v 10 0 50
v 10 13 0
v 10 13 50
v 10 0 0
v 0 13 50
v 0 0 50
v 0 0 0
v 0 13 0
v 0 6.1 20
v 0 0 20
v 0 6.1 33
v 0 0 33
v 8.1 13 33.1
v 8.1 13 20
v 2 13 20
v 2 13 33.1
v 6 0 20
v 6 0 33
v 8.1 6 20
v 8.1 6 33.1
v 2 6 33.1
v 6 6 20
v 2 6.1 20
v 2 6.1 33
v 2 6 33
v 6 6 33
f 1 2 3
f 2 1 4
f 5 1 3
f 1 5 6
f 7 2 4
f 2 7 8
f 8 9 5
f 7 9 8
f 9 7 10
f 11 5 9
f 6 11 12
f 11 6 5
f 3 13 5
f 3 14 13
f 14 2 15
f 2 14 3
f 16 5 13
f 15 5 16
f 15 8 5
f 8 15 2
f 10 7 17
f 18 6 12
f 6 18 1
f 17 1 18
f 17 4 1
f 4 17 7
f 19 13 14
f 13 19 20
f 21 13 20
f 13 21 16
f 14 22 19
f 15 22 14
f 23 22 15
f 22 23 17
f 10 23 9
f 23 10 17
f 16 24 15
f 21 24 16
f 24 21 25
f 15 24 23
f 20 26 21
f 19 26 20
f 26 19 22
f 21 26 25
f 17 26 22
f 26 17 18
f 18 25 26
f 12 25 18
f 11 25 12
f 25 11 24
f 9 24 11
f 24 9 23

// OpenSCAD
verfuegendeTiefe = 23 - 10;
schalterSpiel = 2;
schalterLaenge = 13;
schalterBreite = 6;
schalterHoehe = 7;

difference() {
    cube([10, verfuegendeTiefe, 50]);
    translate([2, verfuegendeTiefe - schalterHoehe, 20]) cube([schalterBreite+0.1, schalterHoehe+1, schalterLaenge+0.1]);
    translate([4, -1, 20]) cube([2, 20, schalterLaenge]);
    translate([-1, -1, 20]) cube([6, 7.1, schalterLaenge]);
}
